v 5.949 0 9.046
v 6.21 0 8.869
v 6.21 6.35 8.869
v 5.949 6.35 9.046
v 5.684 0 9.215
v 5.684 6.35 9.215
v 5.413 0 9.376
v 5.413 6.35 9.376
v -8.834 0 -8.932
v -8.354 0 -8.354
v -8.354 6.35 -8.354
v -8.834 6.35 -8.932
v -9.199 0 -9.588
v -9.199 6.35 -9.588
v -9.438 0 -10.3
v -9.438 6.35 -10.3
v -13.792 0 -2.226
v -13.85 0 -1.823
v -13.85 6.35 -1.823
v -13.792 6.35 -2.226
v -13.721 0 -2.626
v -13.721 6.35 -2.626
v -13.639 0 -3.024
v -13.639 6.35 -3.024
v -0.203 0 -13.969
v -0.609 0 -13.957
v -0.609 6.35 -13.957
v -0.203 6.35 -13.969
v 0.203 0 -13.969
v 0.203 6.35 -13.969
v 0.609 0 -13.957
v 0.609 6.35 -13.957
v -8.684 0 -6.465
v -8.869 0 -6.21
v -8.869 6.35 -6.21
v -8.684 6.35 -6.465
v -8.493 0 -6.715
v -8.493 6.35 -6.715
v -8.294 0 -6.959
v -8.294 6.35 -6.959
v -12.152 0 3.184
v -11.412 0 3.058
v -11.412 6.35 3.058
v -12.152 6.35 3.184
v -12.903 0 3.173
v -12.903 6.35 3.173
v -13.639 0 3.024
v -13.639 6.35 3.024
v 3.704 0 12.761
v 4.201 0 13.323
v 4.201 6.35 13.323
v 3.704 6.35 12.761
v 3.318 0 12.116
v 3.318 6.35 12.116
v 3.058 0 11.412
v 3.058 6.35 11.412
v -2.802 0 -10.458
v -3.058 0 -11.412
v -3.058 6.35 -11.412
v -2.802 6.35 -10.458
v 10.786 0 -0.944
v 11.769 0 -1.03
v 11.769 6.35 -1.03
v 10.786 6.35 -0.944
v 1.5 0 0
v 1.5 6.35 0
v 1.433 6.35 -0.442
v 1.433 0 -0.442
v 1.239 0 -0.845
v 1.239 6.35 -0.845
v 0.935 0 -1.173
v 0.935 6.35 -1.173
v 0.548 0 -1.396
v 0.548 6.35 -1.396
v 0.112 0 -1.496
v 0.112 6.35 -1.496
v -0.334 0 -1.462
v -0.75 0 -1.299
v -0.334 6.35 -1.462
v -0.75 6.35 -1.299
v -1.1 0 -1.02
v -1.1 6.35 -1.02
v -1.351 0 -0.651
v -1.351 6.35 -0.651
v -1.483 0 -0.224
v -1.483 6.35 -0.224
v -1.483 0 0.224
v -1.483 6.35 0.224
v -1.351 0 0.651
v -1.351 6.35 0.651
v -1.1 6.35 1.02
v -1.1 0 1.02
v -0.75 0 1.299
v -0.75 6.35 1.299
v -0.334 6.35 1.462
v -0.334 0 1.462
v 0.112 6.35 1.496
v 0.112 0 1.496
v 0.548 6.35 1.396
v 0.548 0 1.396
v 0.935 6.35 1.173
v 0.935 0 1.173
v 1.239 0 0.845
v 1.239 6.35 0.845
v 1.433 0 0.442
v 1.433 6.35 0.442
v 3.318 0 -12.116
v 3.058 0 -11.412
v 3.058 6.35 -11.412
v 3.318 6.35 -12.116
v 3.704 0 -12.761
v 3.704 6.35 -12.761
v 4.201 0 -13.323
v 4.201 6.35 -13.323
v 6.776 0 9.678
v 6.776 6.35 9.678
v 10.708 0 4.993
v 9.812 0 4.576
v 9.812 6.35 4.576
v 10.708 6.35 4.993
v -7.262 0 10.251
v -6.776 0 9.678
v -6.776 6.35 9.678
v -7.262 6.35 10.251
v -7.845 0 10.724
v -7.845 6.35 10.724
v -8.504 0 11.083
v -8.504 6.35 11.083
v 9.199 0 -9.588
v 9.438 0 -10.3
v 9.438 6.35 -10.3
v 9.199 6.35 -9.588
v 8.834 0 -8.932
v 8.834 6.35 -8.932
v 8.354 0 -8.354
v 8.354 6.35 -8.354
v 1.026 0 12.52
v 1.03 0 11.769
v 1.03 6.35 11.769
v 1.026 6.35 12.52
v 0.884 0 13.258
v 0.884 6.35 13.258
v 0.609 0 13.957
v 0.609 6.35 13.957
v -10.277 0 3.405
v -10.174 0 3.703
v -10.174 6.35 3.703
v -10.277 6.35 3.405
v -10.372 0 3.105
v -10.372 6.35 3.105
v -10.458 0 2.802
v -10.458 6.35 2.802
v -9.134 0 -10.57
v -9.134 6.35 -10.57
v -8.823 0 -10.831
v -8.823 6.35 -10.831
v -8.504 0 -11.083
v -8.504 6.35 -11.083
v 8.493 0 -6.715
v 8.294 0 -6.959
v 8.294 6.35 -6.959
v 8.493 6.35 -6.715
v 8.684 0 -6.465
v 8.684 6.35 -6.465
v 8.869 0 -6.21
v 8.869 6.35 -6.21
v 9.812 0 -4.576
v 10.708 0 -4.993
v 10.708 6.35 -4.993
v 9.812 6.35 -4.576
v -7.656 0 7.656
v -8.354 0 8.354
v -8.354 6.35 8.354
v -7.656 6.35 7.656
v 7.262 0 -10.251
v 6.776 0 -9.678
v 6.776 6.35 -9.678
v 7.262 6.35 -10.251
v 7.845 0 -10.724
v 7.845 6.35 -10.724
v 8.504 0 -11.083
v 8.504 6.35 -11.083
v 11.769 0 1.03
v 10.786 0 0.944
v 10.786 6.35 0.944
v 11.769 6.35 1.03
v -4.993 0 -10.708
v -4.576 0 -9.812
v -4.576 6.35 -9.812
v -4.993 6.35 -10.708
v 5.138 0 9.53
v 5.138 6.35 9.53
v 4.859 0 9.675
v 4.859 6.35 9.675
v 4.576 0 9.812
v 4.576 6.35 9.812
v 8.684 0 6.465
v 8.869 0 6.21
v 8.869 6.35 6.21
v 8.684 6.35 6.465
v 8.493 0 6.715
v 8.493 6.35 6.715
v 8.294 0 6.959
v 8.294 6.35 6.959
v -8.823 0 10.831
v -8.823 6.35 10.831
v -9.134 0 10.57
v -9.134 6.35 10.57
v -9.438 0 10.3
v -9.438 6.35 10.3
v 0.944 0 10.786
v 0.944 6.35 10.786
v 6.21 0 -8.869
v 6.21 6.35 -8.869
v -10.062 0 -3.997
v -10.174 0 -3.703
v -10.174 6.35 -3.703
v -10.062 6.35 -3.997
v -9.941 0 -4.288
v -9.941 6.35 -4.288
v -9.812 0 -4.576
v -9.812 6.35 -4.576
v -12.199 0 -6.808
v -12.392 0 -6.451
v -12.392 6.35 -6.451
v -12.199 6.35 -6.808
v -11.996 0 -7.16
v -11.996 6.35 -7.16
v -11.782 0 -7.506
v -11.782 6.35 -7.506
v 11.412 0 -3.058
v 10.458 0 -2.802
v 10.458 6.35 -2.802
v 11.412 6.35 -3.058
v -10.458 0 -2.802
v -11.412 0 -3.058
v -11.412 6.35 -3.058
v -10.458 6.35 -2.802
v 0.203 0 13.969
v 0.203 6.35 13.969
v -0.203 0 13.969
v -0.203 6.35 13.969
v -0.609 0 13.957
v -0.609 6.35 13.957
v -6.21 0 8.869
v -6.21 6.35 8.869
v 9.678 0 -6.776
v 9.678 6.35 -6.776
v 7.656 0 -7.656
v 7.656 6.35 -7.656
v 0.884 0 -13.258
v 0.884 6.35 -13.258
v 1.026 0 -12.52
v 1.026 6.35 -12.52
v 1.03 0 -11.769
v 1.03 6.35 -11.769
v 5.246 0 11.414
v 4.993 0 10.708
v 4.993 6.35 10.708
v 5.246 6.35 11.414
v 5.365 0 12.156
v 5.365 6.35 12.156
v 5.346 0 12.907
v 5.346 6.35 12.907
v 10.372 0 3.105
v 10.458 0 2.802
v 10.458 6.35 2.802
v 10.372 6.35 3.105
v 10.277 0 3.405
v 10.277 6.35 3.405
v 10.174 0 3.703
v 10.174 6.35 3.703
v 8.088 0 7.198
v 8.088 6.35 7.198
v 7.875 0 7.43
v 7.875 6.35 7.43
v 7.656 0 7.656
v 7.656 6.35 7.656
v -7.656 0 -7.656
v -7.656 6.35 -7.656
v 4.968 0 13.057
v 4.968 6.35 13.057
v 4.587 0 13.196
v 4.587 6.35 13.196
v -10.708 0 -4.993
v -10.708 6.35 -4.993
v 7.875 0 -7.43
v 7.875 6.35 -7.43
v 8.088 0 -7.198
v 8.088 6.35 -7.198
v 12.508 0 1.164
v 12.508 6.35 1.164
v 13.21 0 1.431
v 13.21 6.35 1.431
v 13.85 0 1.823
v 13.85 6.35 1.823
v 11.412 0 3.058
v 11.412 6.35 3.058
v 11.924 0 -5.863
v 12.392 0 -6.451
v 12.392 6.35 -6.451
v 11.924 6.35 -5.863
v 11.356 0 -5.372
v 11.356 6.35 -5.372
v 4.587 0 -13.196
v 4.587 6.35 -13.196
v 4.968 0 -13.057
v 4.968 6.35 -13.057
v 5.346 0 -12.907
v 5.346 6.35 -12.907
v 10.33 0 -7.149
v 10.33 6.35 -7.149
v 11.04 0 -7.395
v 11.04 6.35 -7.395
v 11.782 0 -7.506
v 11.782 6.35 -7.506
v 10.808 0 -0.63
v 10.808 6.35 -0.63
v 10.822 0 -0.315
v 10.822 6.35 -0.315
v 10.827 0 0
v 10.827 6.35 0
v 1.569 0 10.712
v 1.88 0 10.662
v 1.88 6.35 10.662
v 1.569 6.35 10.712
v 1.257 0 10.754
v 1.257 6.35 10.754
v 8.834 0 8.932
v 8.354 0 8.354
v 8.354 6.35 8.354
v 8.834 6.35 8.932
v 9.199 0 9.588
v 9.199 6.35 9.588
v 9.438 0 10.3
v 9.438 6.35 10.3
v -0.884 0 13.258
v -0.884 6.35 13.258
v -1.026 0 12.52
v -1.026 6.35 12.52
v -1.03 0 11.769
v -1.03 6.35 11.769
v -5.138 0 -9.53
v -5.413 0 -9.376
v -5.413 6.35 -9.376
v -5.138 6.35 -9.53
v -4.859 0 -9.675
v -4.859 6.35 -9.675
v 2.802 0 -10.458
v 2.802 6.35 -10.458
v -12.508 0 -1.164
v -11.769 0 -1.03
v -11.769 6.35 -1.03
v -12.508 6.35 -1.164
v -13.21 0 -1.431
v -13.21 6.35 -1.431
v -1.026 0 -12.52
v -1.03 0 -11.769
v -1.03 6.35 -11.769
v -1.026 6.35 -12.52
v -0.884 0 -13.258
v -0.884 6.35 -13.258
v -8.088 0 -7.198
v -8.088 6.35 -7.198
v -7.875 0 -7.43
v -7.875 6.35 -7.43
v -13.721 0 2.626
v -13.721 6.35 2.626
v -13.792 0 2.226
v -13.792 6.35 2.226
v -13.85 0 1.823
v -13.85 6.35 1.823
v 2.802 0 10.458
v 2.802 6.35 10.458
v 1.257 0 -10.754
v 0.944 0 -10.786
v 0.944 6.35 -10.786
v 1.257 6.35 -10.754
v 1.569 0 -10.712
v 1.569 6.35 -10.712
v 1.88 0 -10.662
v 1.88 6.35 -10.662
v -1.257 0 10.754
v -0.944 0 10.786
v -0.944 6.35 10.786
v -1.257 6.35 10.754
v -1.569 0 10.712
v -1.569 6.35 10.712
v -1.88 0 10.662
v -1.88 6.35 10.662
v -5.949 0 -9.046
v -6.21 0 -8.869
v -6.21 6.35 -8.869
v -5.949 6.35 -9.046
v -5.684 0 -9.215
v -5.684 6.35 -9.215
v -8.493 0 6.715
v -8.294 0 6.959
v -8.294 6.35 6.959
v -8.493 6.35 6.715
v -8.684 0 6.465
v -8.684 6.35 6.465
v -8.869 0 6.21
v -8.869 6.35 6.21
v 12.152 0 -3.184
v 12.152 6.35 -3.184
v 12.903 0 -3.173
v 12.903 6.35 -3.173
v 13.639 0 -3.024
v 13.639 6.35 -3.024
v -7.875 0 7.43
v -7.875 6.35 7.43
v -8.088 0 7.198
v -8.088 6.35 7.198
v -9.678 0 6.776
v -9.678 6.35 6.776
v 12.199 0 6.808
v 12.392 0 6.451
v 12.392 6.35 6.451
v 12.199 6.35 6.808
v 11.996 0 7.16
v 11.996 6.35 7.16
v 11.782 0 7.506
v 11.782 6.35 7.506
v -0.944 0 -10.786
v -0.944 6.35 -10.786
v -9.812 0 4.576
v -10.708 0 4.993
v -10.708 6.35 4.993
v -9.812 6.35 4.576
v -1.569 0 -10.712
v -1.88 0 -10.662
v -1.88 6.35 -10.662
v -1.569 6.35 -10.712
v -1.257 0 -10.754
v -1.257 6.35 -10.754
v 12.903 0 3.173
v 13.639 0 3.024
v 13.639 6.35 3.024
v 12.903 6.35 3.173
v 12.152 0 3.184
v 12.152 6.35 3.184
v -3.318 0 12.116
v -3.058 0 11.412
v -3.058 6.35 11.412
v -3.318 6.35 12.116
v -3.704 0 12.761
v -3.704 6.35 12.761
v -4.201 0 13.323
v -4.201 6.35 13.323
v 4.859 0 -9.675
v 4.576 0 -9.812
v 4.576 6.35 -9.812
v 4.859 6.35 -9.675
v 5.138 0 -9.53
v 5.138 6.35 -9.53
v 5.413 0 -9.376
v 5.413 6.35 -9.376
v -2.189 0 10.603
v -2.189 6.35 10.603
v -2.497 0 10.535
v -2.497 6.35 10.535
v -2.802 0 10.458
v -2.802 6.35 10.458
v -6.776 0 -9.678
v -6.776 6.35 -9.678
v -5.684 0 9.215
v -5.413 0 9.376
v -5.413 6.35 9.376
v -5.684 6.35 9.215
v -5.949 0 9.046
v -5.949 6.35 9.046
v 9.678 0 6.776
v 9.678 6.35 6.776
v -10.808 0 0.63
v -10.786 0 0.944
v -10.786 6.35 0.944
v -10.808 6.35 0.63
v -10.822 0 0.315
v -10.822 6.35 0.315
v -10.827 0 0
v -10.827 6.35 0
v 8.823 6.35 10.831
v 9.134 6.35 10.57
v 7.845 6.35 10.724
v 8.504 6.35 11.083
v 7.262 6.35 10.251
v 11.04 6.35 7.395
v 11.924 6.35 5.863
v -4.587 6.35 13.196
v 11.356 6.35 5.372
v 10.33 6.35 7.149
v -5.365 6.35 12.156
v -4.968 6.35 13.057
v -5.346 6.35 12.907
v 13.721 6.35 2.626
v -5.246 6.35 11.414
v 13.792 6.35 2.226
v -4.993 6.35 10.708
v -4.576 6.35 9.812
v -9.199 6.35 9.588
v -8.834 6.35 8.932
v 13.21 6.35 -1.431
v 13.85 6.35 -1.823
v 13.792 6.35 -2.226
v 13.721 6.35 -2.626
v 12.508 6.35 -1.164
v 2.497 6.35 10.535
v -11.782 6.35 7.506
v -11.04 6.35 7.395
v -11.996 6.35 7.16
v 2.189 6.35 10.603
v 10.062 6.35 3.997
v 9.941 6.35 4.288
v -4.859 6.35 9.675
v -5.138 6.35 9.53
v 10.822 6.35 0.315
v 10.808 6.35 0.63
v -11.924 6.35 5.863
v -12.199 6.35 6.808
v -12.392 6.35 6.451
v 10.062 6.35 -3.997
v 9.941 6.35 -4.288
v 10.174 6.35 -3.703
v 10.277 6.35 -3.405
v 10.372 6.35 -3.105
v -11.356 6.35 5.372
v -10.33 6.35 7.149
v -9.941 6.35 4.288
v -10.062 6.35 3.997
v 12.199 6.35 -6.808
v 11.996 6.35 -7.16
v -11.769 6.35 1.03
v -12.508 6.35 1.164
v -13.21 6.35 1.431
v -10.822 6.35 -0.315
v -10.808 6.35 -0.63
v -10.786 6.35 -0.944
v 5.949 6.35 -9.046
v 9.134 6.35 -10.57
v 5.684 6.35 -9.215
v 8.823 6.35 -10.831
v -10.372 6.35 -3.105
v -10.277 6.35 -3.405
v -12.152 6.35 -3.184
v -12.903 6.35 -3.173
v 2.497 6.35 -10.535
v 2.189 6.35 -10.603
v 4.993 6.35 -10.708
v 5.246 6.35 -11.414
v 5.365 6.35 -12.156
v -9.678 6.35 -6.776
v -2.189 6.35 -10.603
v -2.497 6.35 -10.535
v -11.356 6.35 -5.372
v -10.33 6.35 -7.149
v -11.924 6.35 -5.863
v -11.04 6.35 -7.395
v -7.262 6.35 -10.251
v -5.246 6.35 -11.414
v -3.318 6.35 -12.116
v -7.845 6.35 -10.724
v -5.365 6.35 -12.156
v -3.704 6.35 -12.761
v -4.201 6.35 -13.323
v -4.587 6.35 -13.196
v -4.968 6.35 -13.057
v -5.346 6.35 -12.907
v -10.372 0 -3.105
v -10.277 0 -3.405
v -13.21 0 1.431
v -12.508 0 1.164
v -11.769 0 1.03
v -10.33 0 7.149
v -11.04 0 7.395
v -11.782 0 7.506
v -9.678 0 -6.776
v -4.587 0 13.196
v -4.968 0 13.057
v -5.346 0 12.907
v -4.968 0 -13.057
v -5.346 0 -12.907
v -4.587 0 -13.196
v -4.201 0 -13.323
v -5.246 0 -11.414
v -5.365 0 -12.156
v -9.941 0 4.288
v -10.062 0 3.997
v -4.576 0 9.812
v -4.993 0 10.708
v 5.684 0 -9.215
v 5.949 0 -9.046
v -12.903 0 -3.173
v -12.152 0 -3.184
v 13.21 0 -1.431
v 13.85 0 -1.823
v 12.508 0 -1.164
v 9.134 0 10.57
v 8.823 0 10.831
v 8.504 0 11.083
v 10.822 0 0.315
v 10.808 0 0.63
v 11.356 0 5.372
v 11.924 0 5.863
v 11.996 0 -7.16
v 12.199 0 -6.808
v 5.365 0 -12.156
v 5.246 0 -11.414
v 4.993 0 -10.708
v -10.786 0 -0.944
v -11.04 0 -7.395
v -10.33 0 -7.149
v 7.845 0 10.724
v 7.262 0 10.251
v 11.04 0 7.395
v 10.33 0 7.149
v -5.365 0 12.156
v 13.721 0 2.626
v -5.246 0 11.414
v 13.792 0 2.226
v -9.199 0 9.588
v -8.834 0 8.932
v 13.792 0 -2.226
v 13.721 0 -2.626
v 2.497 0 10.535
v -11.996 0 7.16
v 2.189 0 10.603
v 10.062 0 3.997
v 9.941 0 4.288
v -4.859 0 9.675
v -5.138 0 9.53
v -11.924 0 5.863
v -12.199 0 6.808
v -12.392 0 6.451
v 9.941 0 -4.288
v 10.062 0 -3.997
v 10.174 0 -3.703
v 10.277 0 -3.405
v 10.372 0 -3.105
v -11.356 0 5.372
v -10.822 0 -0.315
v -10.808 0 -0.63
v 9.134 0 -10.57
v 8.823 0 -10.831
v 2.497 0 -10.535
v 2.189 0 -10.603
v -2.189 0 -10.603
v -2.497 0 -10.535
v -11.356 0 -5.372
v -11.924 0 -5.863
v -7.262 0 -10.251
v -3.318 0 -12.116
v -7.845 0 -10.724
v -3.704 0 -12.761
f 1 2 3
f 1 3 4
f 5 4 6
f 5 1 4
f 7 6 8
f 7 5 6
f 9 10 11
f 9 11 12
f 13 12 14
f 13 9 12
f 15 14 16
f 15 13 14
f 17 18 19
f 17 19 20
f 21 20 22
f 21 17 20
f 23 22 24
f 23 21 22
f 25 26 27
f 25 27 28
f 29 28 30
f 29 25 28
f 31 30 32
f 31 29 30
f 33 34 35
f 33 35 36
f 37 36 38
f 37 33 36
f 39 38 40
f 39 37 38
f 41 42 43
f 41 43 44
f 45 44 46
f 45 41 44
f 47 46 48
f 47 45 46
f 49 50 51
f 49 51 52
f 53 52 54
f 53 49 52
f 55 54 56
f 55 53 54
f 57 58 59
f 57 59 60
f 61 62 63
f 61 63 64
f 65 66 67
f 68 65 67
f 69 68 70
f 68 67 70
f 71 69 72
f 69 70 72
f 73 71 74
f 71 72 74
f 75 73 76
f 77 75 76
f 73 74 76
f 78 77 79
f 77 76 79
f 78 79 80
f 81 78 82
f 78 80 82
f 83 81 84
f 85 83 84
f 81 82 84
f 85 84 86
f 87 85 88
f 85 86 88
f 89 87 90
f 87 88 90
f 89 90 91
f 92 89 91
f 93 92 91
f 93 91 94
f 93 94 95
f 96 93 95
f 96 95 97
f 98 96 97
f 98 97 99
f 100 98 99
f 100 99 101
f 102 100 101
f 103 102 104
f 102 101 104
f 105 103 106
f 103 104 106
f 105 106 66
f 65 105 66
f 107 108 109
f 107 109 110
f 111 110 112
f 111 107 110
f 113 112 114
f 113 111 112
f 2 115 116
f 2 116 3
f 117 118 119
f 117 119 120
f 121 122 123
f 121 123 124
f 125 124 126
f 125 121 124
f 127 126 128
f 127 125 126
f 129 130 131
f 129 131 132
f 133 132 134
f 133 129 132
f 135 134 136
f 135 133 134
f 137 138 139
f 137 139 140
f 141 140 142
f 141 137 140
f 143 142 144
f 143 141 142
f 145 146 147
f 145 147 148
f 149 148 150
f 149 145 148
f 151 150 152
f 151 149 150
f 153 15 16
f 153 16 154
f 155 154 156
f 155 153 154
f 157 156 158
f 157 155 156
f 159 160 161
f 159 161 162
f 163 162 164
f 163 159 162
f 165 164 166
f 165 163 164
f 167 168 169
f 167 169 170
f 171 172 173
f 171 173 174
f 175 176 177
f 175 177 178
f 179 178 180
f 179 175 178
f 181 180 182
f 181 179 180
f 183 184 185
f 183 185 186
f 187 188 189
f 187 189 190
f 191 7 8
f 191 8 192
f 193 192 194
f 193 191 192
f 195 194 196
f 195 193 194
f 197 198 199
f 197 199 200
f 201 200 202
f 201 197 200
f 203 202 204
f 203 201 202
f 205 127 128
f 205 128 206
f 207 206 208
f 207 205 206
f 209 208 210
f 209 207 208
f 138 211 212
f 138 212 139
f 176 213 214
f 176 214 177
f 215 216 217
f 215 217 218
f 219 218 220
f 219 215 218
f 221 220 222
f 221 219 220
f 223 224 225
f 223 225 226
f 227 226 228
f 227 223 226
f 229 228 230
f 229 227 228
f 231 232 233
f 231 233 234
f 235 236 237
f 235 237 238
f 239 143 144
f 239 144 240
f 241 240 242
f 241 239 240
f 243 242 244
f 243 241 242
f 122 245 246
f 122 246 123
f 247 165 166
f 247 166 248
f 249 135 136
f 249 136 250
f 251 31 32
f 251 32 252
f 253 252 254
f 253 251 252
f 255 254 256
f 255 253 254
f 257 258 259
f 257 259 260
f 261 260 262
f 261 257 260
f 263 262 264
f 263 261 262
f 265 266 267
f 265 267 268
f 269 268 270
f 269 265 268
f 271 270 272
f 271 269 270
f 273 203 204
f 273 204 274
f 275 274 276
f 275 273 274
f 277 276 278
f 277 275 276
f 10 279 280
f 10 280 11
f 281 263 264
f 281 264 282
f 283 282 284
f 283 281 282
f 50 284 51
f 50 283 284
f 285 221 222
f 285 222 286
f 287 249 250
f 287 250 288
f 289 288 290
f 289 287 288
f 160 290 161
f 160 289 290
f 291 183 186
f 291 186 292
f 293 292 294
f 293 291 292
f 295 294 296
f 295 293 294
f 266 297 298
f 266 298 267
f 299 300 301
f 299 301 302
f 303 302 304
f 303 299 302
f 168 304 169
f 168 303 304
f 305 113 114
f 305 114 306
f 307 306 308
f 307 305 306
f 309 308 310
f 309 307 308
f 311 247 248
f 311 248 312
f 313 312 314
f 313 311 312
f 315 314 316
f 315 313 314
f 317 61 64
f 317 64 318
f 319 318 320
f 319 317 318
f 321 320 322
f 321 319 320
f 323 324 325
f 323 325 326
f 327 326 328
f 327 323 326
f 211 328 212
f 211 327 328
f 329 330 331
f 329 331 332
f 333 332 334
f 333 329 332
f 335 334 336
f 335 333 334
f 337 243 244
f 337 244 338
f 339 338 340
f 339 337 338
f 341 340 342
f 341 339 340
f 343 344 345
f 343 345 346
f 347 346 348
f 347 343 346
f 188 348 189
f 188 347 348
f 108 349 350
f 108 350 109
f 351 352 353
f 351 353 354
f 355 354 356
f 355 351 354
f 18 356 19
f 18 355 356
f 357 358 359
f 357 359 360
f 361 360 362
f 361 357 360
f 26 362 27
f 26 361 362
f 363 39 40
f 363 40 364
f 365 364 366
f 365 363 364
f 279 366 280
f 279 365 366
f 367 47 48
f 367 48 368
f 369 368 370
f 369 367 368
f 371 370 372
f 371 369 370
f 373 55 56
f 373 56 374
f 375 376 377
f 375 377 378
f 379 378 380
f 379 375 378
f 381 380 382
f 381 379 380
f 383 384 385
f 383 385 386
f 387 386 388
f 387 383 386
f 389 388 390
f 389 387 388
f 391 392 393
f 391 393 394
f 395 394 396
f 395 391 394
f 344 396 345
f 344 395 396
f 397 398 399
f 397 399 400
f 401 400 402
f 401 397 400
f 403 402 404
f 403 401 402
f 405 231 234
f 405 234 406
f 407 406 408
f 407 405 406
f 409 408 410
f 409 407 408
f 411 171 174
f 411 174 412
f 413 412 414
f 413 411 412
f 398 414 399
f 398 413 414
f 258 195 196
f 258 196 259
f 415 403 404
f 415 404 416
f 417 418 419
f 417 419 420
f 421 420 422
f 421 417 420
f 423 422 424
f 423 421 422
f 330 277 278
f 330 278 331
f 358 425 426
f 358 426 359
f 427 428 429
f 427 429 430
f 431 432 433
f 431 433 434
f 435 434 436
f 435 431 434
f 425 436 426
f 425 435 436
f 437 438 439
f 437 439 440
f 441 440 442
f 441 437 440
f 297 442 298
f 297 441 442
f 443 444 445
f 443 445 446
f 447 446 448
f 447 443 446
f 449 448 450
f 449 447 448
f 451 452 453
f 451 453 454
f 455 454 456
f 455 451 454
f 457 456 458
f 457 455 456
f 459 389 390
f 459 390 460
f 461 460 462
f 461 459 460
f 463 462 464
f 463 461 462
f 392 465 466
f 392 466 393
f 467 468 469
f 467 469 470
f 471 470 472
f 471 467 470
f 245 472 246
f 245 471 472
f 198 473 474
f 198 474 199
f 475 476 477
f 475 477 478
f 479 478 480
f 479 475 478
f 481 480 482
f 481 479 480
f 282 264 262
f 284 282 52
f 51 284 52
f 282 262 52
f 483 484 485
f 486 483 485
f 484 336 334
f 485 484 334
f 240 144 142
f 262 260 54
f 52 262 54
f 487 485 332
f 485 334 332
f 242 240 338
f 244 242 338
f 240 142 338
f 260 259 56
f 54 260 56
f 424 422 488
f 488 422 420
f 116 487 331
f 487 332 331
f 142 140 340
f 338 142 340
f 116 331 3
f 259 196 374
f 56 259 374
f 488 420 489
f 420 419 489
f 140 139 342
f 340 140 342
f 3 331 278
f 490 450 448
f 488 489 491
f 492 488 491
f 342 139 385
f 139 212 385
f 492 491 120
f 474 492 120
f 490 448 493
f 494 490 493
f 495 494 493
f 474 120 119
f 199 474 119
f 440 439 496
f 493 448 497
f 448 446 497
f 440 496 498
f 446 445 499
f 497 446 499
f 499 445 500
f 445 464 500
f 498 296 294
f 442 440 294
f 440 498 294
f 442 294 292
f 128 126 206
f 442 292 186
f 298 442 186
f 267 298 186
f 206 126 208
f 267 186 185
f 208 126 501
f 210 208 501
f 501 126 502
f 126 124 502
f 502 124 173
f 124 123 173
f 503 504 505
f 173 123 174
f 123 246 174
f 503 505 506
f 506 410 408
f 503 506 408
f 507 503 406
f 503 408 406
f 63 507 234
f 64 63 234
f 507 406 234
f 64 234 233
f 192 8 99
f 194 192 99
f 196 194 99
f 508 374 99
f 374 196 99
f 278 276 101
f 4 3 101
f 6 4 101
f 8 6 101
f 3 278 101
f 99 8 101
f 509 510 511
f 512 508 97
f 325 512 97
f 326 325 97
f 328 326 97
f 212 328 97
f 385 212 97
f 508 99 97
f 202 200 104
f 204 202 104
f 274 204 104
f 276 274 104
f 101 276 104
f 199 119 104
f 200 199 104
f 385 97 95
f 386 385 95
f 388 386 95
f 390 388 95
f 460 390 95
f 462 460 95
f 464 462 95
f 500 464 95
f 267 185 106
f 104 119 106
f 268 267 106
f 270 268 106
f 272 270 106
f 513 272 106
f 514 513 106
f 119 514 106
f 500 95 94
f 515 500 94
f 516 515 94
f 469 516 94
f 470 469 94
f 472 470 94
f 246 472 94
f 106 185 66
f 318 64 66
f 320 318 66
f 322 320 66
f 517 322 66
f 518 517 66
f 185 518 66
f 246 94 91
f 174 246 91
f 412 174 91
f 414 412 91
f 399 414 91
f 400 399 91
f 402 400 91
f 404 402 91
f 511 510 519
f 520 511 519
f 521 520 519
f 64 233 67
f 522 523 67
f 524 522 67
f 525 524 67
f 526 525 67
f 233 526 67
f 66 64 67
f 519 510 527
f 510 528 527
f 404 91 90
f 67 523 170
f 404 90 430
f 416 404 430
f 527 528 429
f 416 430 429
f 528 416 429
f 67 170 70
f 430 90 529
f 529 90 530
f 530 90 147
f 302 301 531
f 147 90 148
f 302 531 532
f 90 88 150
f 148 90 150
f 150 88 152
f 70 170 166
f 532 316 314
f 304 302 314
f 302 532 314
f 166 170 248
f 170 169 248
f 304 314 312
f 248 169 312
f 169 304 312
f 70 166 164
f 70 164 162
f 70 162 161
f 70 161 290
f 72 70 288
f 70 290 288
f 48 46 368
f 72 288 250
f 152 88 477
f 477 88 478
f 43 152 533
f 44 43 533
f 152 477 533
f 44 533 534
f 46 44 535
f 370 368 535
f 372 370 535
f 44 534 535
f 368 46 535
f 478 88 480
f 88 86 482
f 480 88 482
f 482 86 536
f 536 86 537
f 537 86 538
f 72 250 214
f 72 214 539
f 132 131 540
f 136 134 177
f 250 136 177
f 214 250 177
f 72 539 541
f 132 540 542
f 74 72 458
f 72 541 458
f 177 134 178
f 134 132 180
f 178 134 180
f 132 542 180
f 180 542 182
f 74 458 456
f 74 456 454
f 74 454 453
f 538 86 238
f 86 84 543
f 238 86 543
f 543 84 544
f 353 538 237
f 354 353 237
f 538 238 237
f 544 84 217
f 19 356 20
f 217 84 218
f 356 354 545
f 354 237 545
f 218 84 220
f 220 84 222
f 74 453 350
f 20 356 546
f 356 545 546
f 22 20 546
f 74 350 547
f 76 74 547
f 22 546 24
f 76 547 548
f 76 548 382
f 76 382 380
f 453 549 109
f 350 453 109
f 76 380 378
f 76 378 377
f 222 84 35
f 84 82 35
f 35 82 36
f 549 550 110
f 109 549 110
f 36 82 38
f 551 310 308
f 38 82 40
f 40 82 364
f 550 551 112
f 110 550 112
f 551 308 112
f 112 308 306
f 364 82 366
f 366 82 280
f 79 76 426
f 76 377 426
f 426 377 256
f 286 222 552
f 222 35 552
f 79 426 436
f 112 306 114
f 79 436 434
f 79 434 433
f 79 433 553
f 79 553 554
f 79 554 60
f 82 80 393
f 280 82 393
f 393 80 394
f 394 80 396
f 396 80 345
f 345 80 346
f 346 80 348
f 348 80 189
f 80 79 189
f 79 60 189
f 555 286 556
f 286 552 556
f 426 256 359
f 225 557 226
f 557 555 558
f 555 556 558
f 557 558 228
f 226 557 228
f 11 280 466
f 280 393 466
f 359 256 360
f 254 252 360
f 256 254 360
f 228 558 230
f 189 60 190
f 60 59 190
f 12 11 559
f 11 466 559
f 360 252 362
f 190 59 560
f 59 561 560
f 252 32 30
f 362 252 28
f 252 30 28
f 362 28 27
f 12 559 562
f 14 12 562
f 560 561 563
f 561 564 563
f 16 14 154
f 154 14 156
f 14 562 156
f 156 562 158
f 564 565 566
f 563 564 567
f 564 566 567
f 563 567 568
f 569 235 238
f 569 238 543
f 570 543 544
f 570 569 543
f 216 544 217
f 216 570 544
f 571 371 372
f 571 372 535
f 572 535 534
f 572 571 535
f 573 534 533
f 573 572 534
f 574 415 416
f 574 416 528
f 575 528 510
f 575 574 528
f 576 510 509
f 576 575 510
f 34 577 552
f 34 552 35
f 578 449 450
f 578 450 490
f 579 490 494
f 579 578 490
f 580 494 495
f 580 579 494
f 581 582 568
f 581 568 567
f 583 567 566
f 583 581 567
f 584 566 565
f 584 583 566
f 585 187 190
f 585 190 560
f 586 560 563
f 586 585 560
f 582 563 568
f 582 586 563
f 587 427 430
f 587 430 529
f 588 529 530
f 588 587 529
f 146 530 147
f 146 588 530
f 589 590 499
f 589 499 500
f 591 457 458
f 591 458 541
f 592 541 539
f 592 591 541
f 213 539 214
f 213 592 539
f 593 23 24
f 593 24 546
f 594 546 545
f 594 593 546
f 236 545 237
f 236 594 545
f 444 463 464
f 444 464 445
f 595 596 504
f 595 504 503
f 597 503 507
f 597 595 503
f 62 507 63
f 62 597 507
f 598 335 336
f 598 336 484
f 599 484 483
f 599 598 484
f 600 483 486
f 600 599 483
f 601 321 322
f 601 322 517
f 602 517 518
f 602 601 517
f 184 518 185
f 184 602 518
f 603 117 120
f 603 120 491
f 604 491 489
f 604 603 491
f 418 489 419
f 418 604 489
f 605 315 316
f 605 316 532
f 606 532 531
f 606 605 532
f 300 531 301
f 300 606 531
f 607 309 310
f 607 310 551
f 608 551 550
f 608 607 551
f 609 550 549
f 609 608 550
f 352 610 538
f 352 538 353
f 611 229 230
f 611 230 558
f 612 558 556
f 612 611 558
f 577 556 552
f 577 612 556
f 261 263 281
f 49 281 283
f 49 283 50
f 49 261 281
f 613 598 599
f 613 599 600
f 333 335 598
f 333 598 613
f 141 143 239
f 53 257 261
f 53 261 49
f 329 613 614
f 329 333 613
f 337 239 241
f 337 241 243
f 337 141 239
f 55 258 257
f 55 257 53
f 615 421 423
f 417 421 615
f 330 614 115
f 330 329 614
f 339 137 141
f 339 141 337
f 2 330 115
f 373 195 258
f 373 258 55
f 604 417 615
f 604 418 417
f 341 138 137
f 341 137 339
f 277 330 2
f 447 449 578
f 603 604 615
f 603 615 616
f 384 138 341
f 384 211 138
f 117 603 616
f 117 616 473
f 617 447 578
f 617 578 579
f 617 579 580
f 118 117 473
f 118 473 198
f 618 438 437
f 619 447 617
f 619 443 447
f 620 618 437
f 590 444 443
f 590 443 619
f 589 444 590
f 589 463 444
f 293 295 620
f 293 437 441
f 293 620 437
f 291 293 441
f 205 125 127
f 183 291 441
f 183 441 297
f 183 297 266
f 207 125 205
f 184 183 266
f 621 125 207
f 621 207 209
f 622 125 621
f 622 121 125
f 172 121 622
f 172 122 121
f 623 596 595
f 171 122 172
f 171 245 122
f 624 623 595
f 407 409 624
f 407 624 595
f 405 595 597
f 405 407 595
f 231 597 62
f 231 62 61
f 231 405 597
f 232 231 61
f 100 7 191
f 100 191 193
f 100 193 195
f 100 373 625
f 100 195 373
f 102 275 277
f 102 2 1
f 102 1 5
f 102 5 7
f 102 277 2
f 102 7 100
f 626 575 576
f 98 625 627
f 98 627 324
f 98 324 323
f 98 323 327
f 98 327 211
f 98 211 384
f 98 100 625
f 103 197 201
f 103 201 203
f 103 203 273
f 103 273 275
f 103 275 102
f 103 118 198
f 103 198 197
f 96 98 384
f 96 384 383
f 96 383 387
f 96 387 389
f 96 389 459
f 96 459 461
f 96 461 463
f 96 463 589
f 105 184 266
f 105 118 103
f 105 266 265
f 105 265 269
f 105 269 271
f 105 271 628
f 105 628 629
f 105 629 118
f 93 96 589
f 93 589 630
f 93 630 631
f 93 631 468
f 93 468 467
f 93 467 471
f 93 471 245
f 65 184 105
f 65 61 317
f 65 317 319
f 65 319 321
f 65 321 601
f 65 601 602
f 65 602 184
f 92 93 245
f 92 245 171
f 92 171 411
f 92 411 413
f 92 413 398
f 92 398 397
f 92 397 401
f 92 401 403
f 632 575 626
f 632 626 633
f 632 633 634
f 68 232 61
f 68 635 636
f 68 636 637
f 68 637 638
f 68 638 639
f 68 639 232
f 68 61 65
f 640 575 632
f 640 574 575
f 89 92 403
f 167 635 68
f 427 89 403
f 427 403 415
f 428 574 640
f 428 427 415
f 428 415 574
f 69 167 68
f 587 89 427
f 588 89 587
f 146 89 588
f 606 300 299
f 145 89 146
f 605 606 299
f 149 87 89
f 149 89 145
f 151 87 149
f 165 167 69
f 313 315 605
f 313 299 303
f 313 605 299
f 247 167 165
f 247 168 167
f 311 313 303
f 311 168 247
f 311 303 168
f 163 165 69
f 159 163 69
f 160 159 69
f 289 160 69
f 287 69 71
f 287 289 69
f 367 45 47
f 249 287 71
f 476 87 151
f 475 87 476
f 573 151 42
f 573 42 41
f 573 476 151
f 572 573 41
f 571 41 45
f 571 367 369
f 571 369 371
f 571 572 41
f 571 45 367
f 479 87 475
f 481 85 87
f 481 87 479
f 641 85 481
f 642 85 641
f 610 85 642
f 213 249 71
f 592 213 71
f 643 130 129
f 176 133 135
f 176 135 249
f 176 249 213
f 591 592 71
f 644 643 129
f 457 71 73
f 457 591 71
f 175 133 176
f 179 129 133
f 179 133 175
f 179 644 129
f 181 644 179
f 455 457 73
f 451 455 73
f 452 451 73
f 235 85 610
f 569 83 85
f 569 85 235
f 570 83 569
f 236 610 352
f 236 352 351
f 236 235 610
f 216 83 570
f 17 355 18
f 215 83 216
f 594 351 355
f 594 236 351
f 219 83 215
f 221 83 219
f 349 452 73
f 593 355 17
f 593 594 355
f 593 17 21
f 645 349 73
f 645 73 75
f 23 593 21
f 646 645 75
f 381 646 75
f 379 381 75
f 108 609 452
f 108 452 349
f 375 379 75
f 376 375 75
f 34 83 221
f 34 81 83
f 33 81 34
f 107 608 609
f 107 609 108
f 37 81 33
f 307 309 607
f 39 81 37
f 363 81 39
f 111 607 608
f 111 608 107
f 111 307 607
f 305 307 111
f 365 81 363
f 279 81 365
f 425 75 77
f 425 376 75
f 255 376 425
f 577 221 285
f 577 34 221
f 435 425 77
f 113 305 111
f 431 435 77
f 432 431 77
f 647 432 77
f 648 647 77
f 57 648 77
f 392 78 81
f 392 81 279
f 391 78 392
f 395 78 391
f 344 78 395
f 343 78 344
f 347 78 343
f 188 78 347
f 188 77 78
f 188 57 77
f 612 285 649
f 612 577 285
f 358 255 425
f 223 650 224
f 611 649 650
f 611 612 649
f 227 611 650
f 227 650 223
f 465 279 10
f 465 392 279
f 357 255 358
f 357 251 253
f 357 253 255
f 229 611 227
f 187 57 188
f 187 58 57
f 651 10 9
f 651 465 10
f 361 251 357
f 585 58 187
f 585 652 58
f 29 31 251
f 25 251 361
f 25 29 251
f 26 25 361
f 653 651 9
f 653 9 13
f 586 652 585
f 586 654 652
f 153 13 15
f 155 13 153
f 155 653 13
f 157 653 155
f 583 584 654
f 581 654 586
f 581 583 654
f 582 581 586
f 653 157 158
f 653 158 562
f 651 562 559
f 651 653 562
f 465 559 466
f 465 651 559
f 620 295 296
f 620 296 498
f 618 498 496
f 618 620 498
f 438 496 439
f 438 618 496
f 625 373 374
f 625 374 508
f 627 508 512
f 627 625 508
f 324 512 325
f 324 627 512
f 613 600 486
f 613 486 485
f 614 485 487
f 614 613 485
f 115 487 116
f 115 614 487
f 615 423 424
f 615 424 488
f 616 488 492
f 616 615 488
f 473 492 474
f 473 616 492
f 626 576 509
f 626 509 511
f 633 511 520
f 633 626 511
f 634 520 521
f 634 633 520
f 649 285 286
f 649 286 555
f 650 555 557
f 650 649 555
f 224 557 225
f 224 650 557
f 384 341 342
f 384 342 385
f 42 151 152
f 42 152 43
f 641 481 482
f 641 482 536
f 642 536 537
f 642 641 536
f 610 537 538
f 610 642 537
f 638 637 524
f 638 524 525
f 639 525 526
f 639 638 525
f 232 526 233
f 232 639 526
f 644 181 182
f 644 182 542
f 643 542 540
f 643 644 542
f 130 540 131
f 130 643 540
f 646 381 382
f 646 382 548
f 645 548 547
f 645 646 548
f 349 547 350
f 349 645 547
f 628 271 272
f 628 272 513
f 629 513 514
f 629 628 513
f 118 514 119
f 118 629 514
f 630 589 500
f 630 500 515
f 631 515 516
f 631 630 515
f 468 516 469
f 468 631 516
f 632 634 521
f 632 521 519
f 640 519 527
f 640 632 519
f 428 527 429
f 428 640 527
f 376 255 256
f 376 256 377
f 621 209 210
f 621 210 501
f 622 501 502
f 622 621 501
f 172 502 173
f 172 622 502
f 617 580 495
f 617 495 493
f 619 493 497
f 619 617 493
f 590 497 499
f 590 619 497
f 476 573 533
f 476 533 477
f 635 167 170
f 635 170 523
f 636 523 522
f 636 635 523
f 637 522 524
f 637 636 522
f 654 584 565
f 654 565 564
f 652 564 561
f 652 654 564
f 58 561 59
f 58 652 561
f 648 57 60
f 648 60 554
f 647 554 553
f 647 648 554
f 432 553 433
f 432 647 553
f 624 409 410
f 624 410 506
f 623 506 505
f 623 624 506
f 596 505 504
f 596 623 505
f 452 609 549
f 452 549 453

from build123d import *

# Parameters (mm, degrees)
BOSS_EXTRUDE1_DEPTH = 6.35
CIRPATTERN1_COUNT   = 18
SKETCH2_R           = 1.5
CUT_EXTRUDE1_DEPTH  = 6.35


with BuildPart() as part:
    # Sketch1 → Boss-Extrude1 (new body)
    with BuildSketch(Plane(origin=(0, 0, 0), x_dir=(1, 0, 0), z_dir=(0, 1, 0))):
        with BuildLine():
            Line((0, 0), (-1.880045408, 10.66226734))
            ThreePointArc((-1.880045408, 10.66226734), (-1.413174452, 10.734125653), (-0.943613438, 10.785550948))
            Line((-0.943613438, 10.785550948), (-1.029695335, 11.769471531))
            ThreePointArc((-1.029695335, 11.769471531), (-0.972041848, 12.892396814), (-0.609362841, 13.956703655))
            ThreePointArc((-0.609362841, 13.956703655), (0, 13.97), (0.609362841, 13.956703655))
            ThreePointArc((0.609362841, 13.956703655), (0.972041848, 12.892396814), (1.029695335, 11.769471531))
            Line((1.029695335, 11.769471531), (0.943613438, 10.785550948))
            ThreePointArc((0.943613438, 10.785550948), (1.413174452, 10.734125653), (1.880045408, 10.66226734))
            Line((1.880045408, 10.66226734), (0, 0))
        make_face()
    boss_extrude1 = extrude(amount=BOSS_EXTRUDE1_DEPTH)

    # CirPattern1: Boss-Extrude1 ×18 about axis
    cirpattern1_axis = Axis((0, 0, 0), (0, 1, 0))
    for i in range(1, CIRPATTERN1_COUNT):
        add(boss_extrude1.rotate(cirpattern1_axis, i * 360 / CIRPATTERN1_COUNT))

    # Sketch2 → Cut-Extrude1 (cut)
    with BuildSketch(Plane(origin=(0, 6.35, 0), x_dir=(1, 0, 0), z_dir=(0, 1, 0))):
        Circle(SKETCH2_R)
    extrude(amount=-CUT_EXTRUDE1_DEPTH, mode=Mode.SUBTRACT)


solid = part.part
